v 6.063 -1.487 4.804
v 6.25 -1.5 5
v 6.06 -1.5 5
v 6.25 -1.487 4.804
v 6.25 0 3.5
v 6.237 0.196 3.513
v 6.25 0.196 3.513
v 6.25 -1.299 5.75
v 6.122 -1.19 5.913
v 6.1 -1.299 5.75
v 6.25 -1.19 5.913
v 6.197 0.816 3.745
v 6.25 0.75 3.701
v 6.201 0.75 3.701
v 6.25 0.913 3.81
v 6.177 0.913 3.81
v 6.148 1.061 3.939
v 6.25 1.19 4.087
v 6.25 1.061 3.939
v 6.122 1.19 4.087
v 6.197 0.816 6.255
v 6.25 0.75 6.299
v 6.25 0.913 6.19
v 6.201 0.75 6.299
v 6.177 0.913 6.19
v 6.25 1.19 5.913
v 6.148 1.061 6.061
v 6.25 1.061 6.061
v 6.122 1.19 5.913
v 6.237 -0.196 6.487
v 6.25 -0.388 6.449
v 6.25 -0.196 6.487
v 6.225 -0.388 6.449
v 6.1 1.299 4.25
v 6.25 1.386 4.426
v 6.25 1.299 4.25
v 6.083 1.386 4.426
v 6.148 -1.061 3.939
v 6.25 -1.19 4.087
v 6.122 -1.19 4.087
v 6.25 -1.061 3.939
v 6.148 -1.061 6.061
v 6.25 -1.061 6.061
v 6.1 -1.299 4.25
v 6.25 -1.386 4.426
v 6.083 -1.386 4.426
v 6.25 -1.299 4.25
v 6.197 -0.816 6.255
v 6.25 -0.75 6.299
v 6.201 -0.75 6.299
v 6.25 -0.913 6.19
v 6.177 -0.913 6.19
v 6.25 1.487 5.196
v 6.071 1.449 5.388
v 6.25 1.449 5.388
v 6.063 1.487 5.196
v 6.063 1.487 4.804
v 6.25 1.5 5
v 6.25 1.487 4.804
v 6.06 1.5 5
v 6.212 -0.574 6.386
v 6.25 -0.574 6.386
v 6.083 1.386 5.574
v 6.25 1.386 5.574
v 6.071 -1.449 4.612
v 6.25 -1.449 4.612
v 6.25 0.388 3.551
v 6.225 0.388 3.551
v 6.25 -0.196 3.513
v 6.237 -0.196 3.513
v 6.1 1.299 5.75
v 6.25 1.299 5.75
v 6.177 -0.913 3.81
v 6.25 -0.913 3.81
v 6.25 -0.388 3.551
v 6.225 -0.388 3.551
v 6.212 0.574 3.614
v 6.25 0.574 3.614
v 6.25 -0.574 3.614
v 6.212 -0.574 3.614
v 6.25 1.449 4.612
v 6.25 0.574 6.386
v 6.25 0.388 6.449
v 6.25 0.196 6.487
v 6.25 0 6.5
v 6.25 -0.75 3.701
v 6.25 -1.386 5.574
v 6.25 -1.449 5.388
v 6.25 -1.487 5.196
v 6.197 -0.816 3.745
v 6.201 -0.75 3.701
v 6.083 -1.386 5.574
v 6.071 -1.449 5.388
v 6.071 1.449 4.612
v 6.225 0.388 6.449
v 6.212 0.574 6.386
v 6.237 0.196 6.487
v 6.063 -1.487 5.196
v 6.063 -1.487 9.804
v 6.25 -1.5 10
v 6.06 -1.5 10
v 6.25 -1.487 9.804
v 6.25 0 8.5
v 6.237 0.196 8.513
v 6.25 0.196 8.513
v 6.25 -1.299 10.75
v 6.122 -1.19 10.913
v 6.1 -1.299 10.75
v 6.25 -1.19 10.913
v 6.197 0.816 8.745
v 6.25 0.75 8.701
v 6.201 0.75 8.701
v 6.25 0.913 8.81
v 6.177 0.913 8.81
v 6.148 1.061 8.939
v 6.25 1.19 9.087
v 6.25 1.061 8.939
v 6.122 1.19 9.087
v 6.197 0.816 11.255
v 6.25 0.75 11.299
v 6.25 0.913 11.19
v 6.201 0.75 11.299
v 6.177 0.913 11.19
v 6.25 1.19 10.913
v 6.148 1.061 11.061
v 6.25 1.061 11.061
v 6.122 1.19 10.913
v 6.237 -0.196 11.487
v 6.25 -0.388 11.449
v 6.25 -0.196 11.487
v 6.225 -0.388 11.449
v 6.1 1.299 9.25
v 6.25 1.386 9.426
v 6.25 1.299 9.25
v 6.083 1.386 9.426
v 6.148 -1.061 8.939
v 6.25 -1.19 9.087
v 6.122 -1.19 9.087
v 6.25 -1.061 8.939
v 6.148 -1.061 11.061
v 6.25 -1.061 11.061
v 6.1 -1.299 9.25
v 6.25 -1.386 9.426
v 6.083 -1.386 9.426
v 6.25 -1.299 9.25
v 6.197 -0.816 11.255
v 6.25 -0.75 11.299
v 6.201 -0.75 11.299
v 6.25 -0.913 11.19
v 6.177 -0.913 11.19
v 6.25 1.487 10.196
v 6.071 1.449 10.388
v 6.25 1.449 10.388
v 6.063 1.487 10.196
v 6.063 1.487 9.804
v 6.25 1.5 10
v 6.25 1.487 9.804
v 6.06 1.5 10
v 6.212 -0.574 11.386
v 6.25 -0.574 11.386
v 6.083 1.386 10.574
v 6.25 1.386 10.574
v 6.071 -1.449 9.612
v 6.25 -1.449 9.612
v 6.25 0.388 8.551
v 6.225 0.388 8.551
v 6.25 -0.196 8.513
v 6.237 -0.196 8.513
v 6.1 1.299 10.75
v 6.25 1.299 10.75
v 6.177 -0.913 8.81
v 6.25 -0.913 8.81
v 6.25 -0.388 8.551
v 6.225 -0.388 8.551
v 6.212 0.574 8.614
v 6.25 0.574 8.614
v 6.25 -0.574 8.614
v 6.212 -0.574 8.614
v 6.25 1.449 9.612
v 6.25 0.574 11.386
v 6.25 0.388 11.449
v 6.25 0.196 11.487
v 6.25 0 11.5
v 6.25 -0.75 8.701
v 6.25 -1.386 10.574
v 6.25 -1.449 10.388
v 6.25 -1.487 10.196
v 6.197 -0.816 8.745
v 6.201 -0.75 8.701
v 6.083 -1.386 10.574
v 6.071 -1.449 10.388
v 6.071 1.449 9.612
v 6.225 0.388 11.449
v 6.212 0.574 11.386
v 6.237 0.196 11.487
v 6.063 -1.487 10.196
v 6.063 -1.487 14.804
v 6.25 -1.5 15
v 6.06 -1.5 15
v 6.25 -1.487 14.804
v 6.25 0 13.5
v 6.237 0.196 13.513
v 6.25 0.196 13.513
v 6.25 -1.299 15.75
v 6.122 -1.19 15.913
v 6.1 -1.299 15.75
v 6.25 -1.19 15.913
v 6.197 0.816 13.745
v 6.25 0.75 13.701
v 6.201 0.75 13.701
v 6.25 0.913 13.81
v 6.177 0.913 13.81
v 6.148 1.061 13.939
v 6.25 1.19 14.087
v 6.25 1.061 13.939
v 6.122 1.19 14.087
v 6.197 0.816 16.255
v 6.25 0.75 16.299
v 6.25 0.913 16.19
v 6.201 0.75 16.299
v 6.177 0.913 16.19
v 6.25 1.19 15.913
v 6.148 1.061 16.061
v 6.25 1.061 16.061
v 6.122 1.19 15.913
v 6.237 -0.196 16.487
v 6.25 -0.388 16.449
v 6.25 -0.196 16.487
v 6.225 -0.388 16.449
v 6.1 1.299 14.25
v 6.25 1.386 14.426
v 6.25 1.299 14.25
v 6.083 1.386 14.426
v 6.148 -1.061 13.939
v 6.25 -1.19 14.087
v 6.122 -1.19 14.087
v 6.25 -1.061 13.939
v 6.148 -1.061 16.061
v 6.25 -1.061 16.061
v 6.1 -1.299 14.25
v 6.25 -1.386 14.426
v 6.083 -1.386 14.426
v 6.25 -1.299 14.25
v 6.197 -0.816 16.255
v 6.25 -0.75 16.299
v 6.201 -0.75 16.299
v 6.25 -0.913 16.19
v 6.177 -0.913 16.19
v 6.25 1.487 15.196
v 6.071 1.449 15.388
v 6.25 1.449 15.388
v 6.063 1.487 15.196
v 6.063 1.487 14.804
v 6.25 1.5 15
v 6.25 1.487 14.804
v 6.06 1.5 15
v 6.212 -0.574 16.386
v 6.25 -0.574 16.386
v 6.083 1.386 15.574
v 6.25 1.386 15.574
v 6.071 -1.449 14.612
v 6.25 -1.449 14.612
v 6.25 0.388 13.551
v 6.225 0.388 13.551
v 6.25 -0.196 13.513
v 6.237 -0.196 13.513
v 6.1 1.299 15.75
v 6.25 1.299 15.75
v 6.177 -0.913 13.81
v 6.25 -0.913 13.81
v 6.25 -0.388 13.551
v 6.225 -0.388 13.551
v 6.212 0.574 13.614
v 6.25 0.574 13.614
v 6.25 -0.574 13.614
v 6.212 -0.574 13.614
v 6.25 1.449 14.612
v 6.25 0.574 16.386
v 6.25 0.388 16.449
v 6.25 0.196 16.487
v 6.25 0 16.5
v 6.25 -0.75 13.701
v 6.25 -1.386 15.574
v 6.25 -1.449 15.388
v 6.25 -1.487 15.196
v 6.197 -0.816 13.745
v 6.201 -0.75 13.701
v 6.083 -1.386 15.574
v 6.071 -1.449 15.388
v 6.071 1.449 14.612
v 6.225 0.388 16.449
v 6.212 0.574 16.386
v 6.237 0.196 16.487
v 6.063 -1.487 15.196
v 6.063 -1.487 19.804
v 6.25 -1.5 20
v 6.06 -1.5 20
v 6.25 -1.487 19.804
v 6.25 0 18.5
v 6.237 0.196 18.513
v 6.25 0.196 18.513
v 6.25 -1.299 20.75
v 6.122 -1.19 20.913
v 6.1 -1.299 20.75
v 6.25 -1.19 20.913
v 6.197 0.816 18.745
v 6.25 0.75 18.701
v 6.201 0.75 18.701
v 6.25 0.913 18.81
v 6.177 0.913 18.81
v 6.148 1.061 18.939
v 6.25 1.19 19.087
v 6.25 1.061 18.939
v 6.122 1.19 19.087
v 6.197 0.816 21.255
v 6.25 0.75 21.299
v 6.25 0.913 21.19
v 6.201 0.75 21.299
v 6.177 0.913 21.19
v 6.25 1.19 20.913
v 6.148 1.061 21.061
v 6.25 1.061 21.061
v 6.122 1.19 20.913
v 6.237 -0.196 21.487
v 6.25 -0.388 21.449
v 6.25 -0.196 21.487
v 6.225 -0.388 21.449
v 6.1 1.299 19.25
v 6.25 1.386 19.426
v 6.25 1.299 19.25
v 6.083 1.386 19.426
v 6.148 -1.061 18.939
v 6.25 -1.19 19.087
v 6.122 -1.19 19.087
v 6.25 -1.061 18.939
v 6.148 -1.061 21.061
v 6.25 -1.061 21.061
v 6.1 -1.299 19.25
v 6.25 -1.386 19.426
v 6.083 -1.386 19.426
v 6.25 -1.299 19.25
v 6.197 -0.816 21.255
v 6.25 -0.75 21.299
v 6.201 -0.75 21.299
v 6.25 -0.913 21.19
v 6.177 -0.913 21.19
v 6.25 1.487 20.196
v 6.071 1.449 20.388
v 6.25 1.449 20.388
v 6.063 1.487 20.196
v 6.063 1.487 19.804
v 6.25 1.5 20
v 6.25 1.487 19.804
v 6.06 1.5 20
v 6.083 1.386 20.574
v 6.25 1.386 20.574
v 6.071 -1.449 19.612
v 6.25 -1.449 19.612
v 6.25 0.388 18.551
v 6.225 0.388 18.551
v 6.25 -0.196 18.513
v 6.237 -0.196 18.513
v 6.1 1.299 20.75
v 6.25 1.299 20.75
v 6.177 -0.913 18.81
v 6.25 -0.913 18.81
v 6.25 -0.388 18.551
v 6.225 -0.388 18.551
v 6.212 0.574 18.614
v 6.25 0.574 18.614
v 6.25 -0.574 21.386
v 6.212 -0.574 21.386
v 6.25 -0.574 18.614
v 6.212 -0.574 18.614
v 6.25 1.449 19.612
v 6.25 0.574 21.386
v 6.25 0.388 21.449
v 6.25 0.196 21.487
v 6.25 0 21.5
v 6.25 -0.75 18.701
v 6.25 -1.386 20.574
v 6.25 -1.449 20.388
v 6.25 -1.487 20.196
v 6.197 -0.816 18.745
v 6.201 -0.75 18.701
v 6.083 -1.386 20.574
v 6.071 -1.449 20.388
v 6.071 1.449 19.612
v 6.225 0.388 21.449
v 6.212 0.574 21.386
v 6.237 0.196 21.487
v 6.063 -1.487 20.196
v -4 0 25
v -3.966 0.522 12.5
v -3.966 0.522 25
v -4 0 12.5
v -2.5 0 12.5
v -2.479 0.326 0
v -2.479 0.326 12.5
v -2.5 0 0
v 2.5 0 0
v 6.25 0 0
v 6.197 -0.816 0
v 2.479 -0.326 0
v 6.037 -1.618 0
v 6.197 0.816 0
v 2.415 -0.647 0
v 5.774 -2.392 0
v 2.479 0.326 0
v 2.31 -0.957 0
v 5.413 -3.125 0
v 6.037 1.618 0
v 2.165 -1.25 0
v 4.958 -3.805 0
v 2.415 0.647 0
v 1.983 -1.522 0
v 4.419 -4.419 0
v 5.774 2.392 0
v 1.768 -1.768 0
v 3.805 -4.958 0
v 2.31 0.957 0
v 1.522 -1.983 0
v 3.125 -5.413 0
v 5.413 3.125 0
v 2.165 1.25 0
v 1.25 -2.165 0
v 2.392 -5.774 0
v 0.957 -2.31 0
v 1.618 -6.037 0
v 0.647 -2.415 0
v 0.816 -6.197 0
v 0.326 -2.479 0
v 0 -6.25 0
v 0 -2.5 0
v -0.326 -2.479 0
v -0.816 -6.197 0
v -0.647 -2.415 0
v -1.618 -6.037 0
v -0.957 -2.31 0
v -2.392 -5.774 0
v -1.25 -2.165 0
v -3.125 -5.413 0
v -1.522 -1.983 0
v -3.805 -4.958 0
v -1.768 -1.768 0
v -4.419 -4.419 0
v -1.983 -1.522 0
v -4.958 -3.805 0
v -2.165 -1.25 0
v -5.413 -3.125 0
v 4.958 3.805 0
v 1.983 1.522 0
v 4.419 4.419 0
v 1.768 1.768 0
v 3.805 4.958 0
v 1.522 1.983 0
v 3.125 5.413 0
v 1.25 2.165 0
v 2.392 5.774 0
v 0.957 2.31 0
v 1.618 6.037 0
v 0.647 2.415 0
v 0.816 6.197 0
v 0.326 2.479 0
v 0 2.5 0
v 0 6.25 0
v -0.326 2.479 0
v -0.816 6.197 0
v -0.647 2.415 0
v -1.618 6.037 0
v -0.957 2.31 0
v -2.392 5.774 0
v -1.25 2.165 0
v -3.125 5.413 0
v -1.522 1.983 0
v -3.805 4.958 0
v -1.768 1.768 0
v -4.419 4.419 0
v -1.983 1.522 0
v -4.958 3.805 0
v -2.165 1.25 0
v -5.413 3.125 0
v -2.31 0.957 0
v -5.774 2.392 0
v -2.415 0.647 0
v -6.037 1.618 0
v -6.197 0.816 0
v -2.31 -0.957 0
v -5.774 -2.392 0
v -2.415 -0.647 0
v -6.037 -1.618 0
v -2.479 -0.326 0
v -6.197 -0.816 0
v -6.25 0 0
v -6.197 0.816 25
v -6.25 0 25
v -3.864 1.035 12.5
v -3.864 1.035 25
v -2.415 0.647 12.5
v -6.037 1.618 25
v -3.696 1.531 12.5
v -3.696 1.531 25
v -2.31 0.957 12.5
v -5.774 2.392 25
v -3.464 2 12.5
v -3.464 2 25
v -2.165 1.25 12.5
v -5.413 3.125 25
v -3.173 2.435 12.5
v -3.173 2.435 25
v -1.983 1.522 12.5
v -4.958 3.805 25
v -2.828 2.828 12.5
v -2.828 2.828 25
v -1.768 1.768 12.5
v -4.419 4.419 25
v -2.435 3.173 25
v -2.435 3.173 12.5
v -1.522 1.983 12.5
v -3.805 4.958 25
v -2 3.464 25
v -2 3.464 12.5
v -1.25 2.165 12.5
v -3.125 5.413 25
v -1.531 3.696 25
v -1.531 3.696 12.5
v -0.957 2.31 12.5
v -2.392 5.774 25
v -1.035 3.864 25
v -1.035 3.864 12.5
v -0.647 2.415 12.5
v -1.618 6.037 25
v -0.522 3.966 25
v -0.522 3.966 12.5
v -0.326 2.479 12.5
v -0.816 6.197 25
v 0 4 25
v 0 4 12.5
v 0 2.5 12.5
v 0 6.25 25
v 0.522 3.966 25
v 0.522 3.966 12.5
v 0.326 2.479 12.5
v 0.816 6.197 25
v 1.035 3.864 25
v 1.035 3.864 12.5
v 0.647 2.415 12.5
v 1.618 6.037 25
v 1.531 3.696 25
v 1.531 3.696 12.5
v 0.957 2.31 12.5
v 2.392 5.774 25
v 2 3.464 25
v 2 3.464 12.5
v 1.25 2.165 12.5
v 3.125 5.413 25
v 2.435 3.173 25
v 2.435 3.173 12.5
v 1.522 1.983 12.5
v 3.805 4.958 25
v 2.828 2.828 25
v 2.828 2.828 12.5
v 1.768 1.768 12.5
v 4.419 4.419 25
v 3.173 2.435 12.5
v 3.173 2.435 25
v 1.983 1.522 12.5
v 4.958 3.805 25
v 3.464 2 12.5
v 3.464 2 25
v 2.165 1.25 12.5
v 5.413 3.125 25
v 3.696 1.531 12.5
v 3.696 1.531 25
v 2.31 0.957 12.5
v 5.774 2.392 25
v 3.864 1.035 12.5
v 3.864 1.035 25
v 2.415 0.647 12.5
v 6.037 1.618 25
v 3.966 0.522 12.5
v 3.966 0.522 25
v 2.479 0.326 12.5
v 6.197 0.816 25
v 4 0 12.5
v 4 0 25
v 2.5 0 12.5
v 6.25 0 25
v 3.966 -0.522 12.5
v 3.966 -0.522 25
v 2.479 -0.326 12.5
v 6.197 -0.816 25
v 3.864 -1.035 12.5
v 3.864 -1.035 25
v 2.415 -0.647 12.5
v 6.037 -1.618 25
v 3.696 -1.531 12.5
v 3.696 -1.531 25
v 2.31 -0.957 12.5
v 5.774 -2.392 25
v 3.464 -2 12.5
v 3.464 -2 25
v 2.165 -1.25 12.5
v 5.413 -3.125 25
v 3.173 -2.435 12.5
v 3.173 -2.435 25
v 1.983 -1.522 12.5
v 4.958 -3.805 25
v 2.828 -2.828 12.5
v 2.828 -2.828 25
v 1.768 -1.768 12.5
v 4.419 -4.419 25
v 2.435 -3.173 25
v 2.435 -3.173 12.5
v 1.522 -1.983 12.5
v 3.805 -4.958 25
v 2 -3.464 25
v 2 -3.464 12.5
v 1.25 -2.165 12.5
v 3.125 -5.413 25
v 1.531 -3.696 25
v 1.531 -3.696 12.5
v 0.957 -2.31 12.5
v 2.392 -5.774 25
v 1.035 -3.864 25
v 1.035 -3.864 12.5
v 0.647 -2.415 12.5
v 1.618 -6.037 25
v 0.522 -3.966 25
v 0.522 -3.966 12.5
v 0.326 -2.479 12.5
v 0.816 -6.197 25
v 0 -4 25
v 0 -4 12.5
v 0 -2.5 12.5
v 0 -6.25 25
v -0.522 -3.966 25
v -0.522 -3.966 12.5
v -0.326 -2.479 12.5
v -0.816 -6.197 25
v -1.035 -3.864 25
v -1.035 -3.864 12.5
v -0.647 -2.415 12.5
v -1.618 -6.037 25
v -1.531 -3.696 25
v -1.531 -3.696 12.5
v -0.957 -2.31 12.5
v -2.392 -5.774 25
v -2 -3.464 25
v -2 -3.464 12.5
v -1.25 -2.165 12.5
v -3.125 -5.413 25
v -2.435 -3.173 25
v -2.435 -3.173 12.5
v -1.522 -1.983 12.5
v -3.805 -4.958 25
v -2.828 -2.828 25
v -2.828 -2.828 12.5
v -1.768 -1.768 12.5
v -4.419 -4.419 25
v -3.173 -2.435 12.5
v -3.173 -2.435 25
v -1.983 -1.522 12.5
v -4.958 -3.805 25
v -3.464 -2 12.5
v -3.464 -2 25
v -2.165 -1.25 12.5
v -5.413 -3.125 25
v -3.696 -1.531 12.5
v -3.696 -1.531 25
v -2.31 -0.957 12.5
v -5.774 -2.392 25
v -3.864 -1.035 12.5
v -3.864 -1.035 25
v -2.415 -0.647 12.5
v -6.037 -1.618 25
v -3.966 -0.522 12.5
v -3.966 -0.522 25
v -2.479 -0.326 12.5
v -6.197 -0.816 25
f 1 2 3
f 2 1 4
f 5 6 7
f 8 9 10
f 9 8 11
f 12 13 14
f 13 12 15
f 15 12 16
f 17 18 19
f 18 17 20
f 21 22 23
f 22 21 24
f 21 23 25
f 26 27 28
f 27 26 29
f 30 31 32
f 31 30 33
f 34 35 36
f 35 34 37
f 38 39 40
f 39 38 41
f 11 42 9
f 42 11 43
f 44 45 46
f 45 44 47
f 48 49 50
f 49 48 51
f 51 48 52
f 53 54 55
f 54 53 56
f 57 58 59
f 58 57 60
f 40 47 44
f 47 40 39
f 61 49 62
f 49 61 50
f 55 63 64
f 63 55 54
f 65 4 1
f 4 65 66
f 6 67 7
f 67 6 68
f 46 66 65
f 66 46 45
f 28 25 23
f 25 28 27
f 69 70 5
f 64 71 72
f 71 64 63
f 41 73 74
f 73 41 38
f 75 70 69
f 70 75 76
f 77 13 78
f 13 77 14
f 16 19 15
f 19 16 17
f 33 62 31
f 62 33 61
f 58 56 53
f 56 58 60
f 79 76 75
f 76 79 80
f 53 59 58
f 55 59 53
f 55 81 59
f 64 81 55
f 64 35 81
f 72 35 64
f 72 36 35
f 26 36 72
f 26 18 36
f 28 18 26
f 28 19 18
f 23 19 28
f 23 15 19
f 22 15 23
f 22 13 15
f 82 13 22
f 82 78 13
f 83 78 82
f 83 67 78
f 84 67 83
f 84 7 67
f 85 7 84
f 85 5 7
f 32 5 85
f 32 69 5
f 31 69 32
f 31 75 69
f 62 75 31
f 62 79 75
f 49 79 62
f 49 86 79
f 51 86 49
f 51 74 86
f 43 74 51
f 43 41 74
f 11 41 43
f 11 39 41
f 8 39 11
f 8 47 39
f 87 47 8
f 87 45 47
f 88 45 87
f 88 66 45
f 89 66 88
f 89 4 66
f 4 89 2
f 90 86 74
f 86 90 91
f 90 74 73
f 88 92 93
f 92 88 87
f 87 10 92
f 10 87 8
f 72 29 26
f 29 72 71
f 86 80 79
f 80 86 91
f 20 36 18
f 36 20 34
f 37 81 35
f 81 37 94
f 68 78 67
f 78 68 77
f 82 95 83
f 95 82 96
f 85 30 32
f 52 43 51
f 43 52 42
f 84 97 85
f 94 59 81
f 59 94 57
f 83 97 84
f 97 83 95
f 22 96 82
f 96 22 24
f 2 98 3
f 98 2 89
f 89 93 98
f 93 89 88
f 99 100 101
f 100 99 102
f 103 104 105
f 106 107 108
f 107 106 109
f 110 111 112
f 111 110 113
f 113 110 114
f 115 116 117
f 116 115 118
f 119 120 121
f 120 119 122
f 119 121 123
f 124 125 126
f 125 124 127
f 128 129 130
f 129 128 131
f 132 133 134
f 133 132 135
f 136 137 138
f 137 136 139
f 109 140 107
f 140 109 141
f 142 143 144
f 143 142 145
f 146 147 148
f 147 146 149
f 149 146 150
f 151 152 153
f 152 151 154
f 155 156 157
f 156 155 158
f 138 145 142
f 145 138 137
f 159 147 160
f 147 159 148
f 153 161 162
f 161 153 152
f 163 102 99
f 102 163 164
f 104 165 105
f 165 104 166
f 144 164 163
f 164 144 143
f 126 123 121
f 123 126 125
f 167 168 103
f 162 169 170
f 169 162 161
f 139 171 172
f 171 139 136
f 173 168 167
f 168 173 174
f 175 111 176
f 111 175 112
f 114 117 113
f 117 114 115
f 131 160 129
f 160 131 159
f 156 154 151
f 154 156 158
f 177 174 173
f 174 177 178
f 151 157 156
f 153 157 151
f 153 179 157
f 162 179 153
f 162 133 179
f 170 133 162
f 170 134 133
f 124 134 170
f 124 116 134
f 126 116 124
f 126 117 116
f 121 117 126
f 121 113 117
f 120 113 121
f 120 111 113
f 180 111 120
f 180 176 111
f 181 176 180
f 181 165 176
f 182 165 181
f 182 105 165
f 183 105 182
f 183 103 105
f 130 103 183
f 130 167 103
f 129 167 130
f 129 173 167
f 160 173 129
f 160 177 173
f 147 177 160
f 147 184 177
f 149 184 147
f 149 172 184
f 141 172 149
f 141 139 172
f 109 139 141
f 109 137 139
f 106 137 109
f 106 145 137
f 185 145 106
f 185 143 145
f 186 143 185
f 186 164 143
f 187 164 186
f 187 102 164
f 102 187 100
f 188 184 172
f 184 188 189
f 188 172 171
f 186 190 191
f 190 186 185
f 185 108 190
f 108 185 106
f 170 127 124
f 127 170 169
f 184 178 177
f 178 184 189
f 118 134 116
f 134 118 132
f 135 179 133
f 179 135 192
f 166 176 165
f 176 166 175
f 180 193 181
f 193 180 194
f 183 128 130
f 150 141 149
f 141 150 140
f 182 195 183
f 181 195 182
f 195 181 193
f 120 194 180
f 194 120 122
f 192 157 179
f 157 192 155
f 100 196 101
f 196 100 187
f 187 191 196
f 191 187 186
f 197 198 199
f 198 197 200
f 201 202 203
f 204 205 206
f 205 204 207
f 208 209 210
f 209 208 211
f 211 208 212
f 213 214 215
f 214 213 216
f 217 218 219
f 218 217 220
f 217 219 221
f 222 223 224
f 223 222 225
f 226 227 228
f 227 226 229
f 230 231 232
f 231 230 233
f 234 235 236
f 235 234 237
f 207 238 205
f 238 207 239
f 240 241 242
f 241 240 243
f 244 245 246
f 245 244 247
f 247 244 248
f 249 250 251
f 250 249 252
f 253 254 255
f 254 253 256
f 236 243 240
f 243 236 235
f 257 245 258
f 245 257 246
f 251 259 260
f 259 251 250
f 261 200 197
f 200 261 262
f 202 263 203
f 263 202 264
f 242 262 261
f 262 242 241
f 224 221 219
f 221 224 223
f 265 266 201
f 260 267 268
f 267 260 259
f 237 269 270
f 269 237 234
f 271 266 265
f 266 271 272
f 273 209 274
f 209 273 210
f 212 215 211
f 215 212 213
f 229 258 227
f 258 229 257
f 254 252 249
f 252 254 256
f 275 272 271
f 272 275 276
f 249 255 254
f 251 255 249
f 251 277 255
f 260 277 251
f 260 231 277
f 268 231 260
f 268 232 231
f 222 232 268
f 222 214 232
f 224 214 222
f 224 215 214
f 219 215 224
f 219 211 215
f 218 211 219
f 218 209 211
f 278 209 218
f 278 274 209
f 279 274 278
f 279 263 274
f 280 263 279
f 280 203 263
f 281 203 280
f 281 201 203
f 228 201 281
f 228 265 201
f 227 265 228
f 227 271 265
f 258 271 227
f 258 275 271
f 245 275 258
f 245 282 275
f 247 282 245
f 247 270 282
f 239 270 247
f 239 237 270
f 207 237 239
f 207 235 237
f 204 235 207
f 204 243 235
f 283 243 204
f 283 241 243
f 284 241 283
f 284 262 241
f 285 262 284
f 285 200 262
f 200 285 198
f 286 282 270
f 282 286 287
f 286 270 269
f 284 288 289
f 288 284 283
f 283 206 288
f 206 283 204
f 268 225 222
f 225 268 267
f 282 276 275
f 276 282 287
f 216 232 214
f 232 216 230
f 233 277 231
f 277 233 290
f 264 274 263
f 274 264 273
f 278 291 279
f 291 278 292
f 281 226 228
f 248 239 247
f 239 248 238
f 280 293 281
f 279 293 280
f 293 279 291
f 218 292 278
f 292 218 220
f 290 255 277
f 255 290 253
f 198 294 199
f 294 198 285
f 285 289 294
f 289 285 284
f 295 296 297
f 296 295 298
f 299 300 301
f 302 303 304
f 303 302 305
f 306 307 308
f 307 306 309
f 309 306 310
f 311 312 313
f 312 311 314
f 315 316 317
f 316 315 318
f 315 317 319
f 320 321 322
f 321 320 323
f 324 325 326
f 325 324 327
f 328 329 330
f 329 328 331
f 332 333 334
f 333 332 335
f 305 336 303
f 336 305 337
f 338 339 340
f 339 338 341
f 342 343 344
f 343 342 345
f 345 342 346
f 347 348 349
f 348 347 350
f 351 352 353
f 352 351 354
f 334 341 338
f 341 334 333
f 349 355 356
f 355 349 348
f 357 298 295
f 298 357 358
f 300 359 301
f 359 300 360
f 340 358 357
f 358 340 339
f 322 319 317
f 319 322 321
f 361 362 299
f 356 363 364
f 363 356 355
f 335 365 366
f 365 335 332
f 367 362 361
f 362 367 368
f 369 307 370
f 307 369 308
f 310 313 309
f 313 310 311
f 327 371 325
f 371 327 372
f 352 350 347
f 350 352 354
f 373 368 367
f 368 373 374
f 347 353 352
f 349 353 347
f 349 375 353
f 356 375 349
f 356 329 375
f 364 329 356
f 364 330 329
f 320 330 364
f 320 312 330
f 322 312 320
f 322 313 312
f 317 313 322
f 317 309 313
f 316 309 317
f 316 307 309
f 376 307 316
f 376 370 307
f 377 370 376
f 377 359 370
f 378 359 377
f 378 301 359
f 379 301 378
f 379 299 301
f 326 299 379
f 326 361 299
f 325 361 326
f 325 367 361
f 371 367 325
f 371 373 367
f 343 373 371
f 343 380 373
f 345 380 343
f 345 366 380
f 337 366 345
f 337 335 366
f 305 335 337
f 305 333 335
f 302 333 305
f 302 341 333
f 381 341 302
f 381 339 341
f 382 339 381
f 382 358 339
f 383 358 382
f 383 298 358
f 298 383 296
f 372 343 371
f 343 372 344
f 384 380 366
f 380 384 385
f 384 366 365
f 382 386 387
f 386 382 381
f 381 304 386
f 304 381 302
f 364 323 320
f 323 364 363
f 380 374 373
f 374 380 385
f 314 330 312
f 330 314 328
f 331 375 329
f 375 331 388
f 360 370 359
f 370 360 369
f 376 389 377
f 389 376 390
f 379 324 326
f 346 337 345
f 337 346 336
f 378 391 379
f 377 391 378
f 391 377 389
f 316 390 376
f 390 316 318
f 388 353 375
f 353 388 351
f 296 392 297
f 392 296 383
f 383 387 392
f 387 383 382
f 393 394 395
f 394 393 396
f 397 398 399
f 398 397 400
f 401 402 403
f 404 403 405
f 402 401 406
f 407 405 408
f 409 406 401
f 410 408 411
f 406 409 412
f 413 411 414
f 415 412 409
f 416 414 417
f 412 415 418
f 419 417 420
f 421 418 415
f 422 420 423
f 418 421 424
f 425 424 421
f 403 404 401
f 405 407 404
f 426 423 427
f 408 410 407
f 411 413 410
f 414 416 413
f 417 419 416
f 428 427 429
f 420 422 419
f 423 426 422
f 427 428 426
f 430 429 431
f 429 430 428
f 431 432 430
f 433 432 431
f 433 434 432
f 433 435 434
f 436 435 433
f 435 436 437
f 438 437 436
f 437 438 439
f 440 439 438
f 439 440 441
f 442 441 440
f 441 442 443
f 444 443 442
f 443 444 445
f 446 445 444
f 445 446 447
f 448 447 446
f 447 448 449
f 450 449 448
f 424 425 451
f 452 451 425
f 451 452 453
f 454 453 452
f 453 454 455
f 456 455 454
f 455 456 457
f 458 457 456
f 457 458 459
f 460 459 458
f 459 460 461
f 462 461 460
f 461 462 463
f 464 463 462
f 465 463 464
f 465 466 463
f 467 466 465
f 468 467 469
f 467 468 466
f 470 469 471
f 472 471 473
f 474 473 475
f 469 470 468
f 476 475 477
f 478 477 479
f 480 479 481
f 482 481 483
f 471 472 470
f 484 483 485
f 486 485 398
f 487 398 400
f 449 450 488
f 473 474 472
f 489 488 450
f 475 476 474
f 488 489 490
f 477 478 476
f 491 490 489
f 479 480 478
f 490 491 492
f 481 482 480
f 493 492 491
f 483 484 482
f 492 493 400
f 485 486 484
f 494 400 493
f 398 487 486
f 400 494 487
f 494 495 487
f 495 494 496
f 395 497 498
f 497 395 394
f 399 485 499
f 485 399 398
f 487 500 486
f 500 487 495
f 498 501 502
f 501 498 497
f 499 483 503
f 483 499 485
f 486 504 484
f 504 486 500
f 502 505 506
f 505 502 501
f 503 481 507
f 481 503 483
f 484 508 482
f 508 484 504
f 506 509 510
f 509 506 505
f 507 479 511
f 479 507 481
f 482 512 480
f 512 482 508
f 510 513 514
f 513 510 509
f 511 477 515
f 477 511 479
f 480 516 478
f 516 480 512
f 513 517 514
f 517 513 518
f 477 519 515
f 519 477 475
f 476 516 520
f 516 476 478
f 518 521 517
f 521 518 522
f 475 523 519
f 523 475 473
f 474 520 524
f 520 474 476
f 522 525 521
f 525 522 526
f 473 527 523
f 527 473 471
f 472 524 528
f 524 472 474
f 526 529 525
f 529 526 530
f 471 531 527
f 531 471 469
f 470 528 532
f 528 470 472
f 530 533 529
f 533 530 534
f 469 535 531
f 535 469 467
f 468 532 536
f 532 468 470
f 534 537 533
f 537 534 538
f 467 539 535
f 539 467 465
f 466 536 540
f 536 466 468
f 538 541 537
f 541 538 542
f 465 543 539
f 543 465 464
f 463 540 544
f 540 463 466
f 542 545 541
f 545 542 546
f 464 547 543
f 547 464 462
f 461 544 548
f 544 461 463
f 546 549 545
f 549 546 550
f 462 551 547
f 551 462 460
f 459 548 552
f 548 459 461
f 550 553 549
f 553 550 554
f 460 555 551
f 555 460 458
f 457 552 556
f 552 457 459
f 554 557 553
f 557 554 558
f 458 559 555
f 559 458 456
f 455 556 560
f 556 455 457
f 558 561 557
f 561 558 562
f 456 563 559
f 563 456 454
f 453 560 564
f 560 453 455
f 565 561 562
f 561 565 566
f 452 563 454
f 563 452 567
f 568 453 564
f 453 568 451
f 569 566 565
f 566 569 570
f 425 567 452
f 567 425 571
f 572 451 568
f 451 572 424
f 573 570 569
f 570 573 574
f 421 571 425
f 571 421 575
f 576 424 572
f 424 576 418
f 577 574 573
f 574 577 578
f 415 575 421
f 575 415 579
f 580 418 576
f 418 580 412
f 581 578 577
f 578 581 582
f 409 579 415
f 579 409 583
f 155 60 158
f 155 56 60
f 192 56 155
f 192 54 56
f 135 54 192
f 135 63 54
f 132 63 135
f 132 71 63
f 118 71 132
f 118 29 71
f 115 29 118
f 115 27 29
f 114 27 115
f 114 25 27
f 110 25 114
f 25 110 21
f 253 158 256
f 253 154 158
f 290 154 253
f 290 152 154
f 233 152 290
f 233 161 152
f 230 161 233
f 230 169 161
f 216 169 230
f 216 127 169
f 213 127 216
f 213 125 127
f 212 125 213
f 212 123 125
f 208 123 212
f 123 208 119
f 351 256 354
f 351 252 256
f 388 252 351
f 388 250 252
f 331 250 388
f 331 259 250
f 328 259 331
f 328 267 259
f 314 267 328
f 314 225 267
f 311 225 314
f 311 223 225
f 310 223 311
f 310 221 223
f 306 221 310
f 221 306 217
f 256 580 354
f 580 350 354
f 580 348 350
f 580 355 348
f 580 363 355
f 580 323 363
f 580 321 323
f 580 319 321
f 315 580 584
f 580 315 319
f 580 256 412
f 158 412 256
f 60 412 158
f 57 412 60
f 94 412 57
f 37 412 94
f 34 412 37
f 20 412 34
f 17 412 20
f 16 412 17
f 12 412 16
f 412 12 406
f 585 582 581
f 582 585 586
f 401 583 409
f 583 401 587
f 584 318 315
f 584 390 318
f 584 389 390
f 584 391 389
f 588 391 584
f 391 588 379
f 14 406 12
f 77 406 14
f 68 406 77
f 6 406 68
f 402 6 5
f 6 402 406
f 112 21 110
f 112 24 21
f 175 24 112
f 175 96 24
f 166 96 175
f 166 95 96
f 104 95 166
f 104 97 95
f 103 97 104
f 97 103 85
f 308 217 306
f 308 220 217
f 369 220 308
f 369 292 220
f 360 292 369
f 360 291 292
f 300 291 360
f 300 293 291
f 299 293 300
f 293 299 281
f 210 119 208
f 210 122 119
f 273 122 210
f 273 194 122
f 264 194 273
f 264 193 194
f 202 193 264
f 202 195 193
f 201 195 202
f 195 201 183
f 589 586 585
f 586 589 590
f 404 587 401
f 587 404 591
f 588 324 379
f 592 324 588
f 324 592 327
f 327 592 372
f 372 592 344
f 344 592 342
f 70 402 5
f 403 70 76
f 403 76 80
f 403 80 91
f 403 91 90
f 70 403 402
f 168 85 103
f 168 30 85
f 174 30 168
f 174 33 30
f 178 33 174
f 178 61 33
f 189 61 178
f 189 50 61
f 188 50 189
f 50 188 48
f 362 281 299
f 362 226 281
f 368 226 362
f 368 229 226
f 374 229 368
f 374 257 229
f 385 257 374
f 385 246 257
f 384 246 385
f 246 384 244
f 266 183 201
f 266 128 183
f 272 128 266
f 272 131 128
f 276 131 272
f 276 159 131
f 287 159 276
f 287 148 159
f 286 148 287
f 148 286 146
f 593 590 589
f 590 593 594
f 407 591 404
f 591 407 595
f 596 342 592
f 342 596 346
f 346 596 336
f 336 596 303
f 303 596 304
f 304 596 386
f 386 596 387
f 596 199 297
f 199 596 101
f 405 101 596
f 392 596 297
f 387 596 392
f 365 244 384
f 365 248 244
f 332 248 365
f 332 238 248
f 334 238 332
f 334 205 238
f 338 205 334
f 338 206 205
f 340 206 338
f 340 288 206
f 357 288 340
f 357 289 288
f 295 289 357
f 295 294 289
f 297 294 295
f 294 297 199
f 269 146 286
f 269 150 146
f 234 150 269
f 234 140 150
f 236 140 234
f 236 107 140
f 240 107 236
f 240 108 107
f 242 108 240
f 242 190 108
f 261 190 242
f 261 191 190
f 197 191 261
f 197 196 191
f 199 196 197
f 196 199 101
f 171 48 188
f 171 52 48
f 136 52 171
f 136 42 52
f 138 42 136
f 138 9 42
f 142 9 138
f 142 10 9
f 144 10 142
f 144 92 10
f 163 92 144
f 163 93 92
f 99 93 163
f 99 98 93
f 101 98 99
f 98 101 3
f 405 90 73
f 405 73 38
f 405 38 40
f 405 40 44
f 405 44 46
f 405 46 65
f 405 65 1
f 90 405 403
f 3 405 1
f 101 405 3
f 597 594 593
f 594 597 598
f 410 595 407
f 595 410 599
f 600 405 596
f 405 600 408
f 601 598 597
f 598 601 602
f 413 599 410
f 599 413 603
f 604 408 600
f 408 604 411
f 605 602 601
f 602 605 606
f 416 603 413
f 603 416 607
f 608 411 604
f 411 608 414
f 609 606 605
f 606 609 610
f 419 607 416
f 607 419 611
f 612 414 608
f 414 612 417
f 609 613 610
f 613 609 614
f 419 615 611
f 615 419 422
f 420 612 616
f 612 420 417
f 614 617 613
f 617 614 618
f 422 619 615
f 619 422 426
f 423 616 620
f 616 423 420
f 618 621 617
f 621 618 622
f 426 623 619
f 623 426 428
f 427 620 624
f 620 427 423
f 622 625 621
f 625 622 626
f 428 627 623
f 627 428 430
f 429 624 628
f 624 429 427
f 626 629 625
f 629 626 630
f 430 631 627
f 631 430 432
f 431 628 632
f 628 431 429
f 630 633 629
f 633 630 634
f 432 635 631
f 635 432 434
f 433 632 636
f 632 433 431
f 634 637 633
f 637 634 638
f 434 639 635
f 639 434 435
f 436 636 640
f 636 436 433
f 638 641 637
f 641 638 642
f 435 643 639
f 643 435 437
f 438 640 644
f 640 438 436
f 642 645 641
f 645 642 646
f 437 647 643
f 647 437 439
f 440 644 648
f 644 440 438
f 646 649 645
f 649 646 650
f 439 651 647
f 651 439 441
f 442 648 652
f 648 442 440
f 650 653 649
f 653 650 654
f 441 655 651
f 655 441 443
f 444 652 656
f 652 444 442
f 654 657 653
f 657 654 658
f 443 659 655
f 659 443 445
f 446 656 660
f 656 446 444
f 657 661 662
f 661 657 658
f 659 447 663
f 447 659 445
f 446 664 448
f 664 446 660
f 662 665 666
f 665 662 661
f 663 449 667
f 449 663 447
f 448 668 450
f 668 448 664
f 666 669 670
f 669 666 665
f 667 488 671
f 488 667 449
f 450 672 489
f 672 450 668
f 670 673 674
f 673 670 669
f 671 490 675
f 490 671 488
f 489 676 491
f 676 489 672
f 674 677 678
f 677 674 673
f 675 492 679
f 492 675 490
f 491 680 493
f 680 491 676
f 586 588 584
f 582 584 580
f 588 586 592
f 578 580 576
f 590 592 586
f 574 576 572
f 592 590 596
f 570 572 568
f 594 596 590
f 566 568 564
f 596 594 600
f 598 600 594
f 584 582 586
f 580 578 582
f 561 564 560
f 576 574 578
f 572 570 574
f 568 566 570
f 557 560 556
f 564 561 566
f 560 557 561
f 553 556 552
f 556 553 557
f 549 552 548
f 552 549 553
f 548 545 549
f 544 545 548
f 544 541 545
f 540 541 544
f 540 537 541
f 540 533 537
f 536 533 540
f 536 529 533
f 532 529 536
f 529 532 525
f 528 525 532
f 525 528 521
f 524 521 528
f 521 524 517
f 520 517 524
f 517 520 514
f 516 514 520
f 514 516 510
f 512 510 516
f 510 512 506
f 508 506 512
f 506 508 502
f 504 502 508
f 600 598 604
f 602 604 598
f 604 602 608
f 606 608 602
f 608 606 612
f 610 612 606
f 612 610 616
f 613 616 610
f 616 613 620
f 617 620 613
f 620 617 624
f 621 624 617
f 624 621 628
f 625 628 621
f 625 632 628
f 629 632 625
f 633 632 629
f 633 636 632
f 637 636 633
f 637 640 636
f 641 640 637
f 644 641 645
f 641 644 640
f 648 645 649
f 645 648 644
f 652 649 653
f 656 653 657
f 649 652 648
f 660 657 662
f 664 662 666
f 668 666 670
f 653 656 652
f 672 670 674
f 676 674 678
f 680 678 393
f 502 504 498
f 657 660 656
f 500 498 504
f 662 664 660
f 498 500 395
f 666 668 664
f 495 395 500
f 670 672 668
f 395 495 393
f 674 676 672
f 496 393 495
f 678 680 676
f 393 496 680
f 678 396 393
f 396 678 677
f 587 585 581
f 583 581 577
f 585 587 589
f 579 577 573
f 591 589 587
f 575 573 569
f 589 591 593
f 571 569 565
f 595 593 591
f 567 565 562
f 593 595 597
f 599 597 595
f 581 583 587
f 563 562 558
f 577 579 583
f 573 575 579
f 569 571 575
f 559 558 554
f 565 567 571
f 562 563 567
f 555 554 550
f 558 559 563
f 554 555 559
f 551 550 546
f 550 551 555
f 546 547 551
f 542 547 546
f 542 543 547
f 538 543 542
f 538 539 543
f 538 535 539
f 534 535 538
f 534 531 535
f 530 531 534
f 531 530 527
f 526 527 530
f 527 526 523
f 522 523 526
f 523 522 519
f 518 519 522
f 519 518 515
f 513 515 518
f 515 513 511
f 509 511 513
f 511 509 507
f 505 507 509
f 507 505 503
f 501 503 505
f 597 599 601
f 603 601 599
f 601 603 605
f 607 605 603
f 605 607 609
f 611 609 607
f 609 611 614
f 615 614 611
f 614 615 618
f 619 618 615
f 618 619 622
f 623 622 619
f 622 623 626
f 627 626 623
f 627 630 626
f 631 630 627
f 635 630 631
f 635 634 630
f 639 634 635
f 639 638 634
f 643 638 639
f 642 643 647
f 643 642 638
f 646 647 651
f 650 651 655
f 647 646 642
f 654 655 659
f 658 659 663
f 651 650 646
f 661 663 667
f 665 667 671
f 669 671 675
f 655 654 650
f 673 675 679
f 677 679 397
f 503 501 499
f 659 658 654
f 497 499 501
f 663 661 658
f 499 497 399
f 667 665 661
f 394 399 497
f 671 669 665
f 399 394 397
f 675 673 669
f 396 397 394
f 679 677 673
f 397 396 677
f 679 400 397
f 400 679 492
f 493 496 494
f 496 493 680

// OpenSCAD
// file: ../config.scad
// SCARA 로봇 공통 사양(specification) — 모든 부품 파일에서 include해 사용한다.

$fn = 48;

// ── 공차(tolerance) ──
print_clearance = 0.2;   // FDM 출력 끼워맞춤(fit) 여유 — 압입(press-fit) 자리 제외
eps             = 1/128; // 미세 겹침(epsilon) — 접하는 솔리드를 살짝 겹쳐 동일면(coincident face) z-파이팅 방지

// ── FDM 출력 사양(print specification) ──
fdm_layer_h       = 0.28;   // 레이어 높이(layer height) — 슬라이서(slicer) 설정값과 일치시킨다.
fdm_shoulder_layers = 6;   // 숄더(shoulder) 최소 레이어 수 — FDM 최소 구조 벽(0.4mm 노즐 3겹 ~1.2mm) 기준 하한값.

// ── 레이아웃(layout) ──
// layout_margin — 플레이트 위 부품 배치 공통 여백(margin). 부품 외곽선에서
// 사방으로 주는 값 → 부품끼리는 2*margin 이격, 외곽 가장자리도 margin 확보.
layout_margin = 4;

// ── 시트 형상(seat geometry) ──
// seat_shoulder_t — fdm_layer_h · fdm_shoulder_layers 파생. 슬라이서 설정 변경 시 자동 연동.
seat_shoulder_t = fdm_layer_h * fdm_shoulder_layers;
// main file
/*
 * shaft_couplings.scad - 샤프트 커플링(shaft coupling) 기성품(vitamin)
 *
 * SCARA 수직 병진축(prismatic axis, J1)에서 모터축(motor shaft)과
 * 리드스크루(leadscrew)를 잇는 알루미늄(aluminum) 강성 커플링(rigid
 * coupling). 양단 보어(bore)가 서로 달라(모터 5mm·스크루 8mm) 토크
 * (torque)를 축방향(axial)으로 전달한다.
 *
 * Z 브레이크포인트(Z breakpoint) 최적화: 커플링은 회전 대칭
 * (rotationally symmetric)이라 외곽(OD)과 양단 보어(bore)가 이루는
 * 단(step)을 환형(annular) [r, z] 단면 하나로 묶어 단일 rotate_extrude로
 * 만든다. union·difference 없이 솔리드 하나로 끝낸다. 셋 스크루(set
 * screw) 머리는 양단 옆면에 마커로 배치한다(boolean 없음).
 *
 * 좌표계: 축(axis) = Z, 커플링 바닥 = z=0. z=0..length. 보어 a(모터)가
 * 아래(z=0), 보어 b(스크루)가 위.
 */

include <../config.scad>

/* --- 형상 비율(cosmetic) --- */
set_inset	= 5;	/* 셋 스크루(set screw) 끝면에서 안쪽 거리 */
set_pitch	= 5;	/* 한 보어쪽 두 셋 스크루의 축방향(axial) 간격 */
set_head_d	= 3;	/* 셋 스크루 머리 마커 지름 */
set_head_h	= 1.5;	/* 셋 스크루 머리 마커 돌출 높이 */

/* --- 색상(cosmetic) --- */
c_coupling	= [0.74, 0.75, 0.77];	/* 알루미늄(aluminum) 몸체 */
c_set		= [0.15, 0.15, 0.16];	/* 세트 스크루(set screw) 머리 */

/*
 * 샤프트 커플링 — 외경(od)·길이(length)·양단 보어(bore_a 바닥,
 * bore_b 상단)를 받는다. 외곽과 양단 보어가 만드는 단(step)을 환형
 * 단면 하나로 묶어 rotate_extrude로 돌린다. 보어가 가운데서 만나
 * 막힌 단(blind step)을 이루므로 프로파일만으로 표현된다.
 */
module shaft_coupling(od, length, bore_a, bore_b)
{
	or  = od / 2;		/* 외경 반지름 */
	ar  = bore_a / 2;	/* 바닥 보어(모터축) 반지름 */
	br  = bore_b / 2;	/* 상단 보어(스크루) 반지름 */
	zm  = length / 2;	/* 양단 보어가 만나는 중앙 단(step) */

	/*
	 * 환형 단면: 바깥 벽(아래→위) 후 상단 보어 벽→중앙 단→바닥 보어
	 * 벽 순으로 안쪽 윤곽을 그려 폐합한다. 양단 보어 반경이 달라
	 * 중앙(zm)에서 반경이 꺾이는 막힌 단(blind step)을 이룬다.
	 */
	color(c_coupling)
		rotate_extrude(convexity = 4)
			polygon([[ar, 0],  [or, 0],
				 [or, length], [br, length],
				 [br, zm], [ar, zm]]);

	/*
	 * 셋 스크루(set screw) 머리 — 리지드 커플링(rigid coupling)은
	 * 양단 보어(bore)를 각각 2개 셋 스크루로 무두질(grub)해 축(shaft)을
	 * 눌러 토크(torque)를 전달한다. 보어쪽마다 축방향(axial)으로
	 * set_pitch만큼 떨어뜨린 마커 2개씩(총 4개)을 옆면에 얹는다.
	 */
	color(c_set) {
		translate([or - set_head_h - eps, 0, set_inset])
			rotate([0, 90, 0])
				cylinder(h = set_head_h + eps, d = set_head_d);
		translate([or - set_head_h - eps, 0, set_inset + set_pitch])
			rotate([0, 90, 0])
				cylinder(h = set_head_h + eps, d = set_head_d);
		translate([or - set_head_h - eps, 0, length - set_inset - set_pitch])
			rotate([0, 90, 0])
				cylinder(h = set_head_h + eps, d = set_head_d);
		translate([or - set_head_h - eps, 0, length - set_inset])
			rotate([0, 90, 0])
				cylinder(h = set_head_h + eps, d = set_head_d);
	}
}

/* --- 표준 변형(convenience) — 모터 5mm ↔ 스크루 8mm --- */
module coupling_5x8() { shaft_coupling(12.5, 25, 5, 8); }

coupling_5x8();
